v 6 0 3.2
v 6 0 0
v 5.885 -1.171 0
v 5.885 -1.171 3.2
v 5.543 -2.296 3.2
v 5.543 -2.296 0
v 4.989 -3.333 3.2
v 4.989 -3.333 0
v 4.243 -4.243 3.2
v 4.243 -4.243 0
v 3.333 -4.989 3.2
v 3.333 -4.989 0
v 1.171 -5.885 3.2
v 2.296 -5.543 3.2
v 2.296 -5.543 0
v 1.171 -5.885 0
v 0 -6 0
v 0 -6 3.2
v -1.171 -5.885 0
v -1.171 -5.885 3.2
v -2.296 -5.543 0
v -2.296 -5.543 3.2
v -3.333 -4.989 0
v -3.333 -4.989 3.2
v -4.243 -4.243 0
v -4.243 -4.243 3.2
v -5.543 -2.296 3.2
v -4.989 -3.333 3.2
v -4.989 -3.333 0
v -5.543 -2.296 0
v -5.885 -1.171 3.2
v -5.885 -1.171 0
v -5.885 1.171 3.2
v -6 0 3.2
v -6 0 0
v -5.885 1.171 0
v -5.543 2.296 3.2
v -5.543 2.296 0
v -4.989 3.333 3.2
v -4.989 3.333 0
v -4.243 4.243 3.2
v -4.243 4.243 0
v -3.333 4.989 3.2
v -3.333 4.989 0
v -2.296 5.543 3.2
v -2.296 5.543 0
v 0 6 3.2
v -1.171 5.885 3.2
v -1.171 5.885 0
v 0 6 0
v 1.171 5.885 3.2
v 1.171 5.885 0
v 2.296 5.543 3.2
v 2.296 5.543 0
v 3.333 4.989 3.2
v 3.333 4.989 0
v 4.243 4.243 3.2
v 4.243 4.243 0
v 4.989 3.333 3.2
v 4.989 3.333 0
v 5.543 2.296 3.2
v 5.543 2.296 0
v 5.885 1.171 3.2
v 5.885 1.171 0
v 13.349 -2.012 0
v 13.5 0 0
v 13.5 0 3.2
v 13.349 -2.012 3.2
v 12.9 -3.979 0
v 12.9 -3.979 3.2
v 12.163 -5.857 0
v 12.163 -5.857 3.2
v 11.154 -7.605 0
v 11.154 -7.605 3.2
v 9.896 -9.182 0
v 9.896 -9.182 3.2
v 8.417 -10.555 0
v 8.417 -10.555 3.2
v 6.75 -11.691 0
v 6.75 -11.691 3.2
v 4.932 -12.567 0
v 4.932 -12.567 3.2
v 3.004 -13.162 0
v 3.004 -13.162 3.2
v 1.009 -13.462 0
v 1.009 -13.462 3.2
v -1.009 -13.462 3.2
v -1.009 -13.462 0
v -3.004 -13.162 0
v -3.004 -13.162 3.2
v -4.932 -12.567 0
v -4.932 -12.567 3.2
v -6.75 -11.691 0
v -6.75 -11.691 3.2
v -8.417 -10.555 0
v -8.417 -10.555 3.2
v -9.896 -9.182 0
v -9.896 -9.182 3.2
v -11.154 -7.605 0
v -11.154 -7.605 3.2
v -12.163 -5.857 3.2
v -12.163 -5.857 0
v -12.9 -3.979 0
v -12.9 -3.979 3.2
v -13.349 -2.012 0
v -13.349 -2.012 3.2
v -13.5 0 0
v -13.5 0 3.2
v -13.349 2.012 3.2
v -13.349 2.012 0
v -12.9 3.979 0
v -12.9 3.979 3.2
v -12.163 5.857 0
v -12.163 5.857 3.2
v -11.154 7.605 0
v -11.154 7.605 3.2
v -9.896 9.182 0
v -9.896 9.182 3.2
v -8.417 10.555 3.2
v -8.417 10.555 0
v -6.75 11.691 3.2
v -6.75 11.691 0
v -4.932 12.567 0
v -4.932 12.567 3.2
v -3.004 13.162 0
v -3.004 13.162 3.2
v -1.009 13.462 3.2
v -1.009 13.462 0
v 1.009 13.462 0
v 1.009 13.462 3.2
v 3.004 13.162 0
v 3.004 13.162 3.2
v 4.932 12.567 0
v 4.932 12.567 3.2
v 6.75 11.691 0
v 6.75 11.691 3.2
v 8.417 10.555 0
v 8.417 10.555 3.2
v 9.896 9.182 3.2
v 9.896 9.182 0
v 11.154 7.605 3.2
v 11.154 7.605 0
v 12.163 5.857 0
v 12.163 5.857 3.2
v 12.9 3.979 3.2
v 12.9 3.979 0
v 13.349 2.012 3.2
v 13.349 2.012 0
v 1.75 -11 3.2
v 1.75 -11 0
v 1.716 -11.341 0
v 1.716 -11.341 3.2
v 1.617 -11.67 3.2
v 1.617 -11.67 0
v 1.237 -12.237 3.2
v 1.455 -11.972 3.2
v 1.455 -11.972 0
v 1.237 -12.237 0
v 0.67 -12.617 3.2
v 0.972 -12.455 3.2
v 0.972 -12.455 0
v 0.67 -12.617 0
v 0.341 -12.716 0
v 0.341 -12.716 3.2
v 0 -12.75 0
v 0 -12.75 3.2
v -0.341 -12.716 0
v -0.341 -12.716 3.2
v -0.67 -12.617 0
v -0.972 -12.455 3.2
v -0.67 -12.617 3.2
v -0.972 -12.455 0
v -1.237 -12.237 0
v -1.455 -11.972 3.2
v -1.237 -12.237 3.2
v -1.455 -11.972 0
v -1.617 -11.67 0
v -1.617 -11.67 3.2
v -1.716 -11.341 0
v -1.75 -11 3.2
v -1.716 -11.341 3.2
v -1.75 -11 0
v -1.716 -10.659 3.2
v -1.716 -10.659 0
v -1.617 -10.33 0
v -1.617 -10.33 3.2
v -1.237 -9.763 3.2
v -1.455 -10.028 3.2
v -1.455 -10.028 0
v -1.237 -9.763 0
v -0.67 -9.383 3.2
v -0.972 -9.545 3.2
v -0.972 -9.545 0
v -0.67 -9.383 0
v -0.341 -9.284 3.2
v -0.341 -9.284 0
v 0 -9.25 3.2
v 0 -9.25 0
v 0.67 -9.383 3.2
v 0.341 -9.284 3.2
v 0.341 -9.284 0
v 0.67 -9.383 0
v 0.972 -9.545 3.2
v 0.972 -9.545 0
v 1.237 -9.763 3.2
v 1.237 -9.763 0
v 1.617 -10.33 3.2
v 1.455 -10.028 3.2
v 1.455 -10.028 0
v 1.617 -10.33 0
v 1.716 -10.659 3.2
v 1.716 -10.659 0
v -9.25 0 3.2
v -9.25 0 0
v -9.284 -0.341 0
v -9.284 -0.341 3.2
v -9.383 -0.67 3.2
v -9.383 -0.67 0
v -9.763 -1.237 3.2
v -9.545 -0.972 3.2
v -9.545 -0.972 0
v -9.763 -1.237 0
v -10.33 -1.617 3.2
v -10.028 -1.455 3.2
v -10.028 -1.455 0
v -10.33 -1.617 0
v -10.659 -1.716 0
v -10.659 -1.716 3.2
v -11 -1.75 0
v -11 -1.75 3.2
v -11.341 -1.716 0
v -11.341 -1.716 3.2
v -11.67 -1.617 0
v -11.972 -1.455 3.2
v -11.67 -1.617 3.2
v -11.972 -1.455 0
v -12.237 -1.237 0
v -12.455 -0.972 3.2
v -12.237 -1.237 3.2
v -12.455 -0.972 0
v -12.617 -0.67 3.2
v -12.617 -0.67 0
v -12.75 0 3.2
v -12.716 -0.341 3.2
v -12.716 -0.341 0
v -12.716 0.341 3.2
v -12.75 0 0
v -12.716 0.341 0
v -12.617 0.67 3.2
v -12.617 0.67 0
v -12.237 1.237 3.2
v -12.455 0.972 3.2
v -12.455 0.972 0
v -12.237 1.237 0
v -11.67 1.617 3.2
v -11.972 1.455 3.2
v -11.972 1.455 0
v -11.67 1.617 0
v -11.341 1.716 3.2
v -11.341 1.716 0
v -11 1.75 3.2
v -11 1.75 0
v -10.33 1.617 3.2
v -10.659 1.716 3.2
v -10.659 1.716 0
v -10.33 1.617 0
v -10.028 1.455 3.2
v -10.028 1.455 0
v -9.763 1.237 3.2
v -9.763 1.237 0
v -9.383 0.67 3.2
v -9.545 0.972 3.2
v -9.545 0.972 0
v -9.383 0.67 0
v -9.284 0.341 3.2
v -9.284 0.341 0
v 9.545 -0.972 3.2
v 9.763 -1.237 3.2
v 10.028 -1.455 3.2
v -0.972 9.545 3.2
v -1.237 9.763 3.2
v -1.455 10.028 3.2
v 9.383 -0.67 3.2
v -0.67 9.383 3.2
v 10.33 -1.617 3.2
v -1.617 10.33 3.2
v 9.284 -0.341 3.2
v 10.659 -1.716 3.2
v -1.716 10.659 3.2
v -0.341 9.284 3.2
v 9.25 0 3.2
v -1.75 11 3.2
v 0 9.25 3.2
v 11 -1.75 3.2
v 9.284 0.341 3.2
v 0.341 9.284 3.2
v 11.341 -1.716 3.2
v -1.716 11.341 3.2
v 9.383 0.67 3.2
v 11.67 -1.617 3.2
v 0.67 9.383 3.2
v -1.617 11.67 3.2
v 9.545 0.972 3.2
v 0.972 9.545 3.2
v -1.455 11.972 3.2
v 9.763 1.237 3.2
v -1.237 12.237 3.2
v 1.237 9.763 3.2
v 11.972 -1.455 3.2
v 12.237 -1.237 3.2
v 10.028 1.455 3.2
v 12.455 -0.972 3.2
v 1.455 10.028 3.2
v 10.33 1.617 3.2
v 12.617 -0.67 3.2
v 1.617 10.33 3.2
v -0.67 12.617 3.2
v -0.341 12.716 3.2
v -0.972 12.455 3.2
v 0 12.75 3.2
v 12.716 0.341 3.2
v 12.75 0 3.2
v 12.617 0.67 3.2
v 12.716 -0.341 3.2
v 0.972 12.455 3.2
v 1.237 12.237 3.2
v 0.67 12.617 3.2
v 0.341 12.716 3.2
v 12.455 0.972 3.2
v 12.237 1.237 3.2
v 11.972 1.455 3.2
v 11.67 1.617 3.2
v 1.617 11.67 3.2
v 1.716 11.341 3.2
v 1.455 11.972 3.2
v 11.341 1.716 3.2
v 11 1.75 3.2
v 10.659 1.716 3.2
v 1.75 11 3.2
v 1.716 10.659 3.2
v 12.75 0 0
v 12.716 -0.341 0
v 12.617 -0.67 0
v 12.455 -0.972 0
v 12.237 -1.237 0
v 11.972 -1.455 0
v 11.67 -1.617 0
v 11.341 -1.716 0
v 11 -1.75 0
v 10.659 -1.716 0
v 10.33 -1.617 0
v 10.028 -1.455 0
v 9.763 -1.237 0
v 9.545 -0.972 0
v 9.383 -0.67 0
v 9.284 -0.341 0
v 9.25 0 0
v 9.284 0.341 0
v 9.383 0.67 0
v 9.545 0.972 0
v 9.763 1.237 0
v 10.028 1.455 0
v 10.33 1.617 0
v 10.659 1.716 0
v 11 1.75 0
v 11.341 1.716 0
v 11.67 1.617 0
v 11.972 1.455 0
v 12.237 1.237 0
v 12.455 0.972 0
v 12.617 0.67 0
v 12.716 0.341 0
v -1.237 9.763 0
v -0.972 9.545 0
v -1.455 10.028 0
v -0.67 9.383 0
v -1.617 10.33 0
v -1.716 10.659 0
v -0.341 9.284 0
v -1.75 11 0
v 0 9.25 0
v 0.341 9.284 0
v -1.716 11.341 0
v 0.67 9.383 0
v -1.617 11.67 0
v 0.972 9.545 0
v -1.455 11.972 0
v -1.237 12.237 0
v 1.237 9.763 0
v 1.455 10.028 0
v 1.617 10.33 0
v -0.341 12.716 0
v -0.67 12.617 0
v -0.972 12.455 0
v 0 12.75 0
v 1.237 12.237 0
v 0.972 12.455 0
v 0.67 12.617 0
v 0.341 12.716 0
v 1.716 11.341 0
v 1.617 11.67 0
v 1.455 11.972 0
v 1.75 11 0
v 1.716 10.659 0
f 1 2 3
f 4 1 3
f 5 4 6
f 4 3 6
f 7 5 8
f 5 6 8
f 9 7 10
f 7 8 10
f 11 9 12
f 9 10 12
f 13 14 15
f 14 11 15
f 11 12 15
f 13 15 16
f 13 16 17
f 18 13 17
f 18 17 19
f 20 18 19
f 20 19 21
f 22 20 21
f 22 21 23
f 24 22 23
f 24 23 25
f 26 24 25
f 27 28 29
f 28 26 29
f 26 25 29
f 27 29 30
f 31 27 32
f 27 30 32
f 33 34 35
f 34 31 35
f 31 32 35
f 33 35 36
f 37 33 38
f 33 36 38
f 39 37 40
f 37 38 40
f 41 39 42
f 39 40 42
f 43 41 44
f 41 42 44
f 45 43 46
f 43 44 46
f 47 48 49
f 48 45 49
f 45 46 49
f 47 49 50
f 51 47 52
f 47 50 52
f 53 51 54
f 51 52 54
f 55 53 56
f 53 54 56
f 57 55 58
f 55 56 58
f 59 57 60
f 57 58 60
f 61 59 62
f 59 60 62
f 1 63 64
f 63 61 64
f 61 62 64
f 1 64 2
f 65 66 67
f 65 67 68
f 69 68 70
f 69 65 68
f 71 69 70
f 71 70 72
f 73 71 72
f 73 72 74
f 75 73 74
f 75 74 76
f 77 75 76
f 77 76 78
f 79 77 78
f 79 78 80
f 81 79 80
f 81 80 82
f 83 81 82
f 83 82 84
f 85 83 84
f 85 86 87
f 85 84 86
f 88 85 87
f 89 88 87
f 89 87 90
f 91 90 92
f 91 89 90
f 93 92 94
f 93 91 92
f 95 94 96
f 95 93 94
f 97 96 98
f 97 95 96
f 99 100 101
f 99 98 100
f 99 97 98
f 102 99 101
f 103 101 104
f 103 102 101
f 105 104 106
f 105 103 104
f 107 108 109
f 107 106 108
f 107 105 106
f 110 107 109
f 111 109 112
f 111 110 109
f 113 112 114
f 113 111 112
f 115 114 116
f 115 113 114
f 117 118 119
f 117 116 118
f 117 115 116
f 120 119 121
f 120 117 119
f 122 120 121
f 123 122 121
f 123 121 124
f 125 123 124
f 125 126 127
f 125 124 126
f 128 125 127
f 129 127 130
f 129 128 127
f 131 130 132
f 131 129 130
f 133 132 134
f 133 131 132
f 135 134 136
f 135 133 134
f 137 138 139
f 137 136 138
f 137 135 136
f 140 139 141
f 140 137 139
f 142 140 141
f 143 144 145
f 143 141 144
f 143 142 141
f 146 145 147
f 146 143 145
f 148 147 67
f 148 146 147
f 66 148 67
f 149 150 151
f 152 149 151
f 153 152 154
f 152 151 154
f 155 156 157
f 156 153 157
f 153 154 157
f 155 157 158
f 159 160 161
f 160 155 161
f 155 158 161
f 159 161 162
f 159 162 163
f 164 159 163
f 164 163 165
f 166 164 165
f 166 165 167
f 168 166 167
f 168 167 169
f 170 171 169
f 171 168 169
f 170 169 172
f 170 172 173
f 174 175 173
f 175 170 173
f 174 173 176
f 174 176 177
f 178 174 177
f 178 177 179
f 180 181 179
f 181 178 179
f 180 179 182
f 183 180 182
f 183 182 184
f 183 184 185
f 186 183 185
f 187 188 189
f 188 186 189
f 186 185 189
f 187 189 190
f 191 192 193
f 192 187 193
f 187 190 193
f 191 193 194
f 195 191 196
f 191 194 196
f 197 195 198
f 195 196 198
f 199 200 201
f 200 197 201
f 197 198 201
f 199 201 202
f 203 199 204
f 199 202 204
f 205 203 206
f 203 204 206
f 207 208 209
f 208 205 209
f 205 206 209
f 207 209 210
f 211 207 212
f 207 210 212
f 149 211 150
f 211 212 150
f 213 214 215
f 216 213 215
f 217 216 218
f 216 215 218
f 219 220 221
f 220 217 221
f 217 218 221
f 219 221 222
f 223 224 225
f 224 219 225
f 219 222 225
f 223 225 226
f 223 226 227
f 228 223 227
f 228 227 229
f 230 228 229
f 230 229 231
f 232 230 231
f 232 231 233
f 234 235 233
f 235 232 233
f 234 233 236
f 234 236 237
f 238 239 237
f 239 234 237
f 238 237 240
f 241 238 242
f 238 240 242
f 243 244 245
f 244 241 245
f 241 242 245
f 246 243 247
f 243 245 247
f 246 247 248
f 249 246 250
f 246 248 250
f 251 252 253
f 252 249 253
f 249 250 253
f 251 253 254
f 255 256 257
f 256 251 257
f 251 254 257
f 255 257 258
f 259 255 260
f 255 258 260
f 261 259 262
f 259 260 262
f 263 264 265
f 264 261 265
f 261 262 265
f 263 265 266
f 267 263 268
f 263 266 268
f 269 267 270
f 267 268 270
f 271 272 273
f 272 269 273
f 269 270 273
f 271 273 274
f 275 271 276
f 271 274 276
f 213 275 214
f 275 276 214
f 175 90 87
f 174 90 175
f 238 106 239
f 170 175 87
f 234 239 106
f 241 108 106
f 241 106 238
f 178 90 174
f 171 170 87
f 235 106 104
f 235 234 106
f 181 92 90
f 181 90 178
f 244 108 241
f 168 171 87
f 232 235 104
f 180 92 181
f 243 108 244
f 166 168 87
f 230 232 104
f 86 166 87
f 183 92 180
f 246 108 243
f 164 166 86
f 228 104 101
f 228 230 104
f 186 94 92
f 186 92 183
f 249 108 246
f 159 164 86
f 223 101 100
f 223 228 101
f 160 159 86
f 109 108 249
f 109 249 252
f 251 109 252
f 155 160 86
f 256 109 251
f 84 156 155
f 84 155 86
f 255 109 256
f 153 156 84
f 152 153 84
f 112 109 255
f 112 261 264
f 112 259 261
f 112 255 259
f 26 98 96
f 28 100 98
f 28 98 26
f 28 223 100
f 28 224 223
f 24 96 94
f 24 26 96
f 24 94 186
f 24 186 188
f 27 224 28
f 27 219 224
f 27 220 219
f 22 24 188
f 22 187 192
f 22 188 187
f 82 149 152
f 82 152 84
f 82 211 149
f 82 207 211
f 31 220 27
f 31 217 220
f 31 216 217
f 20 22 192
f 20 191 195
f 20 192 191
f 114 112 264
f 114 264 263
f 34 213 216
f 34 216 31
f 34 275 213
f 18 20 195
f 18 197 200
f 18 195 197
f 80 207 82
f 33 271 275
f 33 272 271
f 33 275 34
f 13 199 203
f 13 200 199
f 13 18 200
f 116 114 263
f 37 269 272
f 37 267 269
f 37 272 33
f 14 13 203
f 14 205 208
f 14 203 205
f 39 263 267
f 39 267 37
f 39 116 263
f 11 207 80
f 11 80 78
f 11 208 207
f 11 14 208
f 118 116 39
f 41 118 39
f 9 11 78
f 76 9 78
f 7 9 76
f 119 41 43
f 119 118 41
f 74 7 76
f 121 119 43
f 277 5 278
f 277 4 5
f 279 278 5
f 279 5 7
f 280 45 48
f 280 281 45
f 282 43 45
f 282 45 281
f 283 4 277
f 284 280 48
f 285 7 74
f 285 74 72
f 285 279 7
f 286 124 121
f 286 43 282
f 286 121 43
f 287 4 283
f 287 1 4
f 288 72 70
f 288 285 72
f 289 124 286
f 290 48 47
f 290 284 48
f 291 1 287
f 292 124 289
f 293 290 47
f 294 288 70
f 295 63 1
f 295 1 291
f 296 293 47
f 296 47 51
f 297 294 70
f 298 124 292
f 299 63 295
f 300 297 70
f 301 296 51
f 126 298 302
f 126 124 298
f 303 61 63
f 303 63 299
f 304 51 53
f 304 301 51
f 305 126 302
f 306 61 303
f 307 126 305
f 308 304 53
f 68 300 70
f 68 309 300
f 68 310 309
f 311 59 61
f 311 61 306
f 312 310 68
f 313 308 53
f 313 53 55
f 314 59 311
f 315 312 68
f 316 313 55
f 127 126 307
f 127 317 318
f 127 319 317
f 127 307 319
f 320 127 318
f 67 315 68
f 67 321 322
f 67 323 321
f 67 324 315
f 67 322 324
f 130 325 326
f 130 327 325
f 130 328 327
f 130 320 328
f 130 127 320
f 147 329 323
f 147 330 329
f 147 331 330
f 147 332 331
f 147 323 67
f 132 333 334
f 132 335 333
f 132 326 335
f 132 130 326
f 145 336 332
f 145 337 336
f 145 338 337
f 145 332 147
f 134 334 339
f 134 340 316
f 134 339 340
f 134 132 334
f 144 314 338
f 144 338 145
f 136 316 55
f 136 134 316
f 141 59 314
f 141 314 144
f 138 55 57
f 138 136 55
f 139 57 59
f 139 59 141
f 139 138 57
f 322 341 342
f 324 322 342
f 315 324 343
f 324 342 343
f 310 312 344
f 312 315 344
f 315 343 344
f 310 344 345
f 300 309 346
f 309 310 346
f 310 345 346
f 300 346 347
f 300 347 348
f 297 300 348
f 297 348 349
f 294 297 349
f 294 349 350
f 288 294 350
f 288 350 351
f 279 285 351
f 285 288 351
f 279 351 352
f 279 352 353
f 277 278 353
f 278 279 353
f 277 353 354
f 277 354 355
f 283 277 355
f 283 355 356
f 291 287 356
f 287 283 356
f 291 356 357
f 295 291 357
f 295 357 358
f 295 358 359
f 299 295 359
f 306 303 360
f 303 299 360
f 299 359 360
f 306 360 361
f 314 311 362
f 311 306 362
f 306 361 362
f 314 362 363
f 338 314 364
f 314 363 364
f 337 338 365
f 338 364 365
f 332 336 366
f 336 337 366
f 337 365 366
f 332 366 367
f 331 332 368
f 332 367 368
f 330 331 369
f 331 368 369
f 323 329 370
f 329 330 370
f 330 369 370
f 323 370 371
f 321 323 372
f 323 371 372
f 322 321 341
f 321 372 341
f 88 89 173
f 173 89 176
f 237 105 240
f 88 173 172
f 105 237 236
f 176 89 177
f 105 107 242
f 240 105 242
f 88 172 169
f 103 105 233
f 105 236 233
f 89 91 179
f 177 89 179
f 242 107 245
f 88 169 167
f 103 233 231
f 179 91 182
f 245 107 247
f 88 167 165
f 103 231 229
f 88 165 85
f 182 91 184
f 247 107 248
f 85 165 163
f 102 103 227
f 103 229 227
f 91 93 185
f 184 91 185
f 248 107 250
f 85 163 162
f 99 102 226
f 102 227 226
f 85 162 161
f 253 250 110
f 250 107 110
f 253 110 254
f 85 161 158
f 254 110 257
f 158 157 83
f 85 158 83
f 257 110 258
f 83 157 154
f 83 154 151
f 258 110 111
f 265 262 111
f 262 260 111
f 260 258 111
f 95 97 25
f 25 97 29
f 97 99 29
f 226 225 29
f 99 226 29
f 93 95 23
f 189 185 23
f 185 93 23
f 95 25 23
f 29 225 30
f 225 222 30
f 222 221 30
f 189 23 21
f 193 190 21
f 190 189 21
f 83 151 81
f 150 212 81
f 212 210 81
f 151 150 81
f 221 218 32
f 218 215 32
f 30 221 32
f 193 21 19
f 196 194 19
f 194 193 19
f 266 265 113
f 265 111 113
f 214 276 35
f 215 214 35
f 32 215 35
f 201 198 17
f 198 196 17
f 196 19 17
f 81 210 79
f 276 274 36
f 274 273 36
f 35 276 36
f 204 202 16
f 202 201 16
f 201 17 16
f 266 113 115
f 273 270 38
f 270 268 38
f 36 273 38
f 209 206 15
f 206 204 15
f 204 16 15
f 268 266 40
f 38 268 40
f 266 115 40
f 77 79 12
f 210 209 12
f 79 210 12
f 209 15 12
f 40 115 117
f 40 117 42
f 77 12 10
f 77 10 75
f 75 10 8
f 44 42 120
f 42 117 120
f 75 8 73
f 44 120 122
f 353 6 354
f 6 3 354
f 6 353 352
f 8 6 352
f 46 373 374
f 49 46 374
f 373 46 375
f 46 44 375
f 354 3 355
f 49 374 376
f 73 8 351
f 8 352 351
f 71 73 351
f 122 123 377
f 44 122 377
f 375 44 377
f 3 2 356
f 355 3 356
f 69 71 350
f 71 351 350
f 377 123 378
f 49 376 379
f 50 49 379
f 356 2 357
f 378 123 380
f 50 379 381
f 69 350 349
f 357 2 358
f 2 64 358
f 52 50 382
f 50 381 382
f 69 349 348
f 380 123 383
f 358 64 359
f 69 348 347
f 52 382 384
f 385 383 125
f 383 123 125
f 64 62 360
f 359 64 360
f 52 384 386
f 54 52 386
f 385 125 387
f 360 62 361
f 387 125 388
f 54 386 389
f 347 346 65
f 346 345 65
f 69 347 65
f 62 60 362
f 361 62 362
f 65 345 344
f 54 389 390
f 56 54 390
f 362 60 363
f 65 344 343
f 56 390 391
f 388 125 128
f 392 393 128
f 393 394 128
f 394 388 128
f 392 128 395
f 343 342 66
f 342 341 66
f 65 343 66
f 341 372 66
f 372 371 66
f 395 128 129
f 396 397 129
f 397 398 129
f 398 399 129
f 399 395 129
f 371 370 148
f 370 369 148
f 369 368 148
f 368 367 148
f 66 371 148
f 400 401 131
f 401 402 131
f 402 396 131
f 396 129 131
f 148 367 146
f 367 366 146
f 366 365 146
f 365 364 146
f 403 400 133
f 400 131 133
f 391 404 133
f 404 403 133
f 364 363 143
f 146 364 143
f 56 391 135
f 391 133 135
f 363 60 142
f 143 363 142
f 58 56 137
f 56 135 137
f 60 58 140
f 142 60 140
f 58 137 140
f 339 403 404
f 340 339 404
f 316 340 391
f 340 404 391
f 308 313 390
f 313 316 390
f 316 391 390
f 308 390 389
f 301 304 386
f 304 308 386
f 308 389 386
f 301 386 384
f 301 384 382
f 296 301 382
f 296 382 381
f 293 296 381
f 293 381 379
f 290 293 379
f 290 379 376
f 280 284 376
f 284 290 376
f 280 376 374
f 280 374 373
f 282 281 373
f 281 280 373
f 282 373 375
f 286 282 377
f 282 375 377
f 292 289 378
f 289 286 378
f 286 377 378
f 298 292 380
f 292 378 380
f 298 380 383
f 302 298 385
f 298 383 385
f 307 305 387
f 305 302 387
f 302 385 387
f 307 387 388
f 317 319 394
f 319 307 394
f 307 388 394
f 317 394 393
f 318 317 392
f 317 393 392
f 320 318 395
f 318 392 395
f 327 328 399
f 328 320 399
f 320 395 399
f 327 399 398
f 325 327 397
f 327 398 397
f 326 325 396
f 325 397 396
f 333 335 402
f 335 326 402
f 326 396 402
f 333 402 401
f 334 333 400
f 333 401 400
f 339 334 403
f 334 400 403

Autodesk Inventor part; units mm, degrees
ref_plane "YZ Plane" through (0, 0, 0) normal (1, 0, 0) x (0, 1, 0)
ref_plane "XZ Plane" through (0, 0, 0) normal (0, 1, 0) x (-1, 0, 0)
ref_plane "XY Plane" through (0, 0, 0) normal (0, 0, 1) x (1, 0, 0)
sketch "スケッチ1" plane through (0, 0, 0) normal (0, 0, 1) x (1, 0, 0)
  circle A0 centre (0, 0) radius 12.8 projected
  circle A1 centre (0, 11) radius 1.35 projected
  circle A2 centre (7.7782, 7.7782) radius 1.35 projected
  circle A3 centre (11, 0) radius 1.35 projected
  circle A4 centre (7.7782, -7.7782) radius 1.35 projected
  circle A5 centre (0, -11) radius 1.35 projected
  circle A6 centre (-7.7782, -7.7782) radius 1.35 projected
  circle A7 centre (-11, 0) radius 1.35 projected
  circle A8 centre (-7.7782, 7.7782) radius 1.35 projected
  circle A9 centre (0, 0) radius 5 projected
  circle A10 centre (0, 8) radius 1 projected
  circle A11 centre (-8, 0) radius 1 projected
  circle A12 centre (8, 0) radius 1 projected
  circle A13 centre (0, -8) radius 1 projected
  circle A14 centre (0, 0) radius 6
  circle A15 centre (0, 0) radius 13.5
  circle A16 centre (0, 11) radius 1.75
  circle A17 centre (-11, 0) radius 1.75
  circle A18 centre (0, -11) radius 1.75
  circle A19 centre (11, 0) radius 1.75
  point P0 (0, 0)
  dimension "d0" = 12
  dimension "d1" = 27
  dimension "d2" = 3.5
  dimension "d3" = 3.5
  dimension "d4" = 3.5
  dimension "d5" = 3.5
extrude "押し出し1" add sketch "スケッチ1" along normal blind 3.2 contours A0 | A2 | A4 | A6 | A8 | A10 | A11 | A12 | A13 | A15
